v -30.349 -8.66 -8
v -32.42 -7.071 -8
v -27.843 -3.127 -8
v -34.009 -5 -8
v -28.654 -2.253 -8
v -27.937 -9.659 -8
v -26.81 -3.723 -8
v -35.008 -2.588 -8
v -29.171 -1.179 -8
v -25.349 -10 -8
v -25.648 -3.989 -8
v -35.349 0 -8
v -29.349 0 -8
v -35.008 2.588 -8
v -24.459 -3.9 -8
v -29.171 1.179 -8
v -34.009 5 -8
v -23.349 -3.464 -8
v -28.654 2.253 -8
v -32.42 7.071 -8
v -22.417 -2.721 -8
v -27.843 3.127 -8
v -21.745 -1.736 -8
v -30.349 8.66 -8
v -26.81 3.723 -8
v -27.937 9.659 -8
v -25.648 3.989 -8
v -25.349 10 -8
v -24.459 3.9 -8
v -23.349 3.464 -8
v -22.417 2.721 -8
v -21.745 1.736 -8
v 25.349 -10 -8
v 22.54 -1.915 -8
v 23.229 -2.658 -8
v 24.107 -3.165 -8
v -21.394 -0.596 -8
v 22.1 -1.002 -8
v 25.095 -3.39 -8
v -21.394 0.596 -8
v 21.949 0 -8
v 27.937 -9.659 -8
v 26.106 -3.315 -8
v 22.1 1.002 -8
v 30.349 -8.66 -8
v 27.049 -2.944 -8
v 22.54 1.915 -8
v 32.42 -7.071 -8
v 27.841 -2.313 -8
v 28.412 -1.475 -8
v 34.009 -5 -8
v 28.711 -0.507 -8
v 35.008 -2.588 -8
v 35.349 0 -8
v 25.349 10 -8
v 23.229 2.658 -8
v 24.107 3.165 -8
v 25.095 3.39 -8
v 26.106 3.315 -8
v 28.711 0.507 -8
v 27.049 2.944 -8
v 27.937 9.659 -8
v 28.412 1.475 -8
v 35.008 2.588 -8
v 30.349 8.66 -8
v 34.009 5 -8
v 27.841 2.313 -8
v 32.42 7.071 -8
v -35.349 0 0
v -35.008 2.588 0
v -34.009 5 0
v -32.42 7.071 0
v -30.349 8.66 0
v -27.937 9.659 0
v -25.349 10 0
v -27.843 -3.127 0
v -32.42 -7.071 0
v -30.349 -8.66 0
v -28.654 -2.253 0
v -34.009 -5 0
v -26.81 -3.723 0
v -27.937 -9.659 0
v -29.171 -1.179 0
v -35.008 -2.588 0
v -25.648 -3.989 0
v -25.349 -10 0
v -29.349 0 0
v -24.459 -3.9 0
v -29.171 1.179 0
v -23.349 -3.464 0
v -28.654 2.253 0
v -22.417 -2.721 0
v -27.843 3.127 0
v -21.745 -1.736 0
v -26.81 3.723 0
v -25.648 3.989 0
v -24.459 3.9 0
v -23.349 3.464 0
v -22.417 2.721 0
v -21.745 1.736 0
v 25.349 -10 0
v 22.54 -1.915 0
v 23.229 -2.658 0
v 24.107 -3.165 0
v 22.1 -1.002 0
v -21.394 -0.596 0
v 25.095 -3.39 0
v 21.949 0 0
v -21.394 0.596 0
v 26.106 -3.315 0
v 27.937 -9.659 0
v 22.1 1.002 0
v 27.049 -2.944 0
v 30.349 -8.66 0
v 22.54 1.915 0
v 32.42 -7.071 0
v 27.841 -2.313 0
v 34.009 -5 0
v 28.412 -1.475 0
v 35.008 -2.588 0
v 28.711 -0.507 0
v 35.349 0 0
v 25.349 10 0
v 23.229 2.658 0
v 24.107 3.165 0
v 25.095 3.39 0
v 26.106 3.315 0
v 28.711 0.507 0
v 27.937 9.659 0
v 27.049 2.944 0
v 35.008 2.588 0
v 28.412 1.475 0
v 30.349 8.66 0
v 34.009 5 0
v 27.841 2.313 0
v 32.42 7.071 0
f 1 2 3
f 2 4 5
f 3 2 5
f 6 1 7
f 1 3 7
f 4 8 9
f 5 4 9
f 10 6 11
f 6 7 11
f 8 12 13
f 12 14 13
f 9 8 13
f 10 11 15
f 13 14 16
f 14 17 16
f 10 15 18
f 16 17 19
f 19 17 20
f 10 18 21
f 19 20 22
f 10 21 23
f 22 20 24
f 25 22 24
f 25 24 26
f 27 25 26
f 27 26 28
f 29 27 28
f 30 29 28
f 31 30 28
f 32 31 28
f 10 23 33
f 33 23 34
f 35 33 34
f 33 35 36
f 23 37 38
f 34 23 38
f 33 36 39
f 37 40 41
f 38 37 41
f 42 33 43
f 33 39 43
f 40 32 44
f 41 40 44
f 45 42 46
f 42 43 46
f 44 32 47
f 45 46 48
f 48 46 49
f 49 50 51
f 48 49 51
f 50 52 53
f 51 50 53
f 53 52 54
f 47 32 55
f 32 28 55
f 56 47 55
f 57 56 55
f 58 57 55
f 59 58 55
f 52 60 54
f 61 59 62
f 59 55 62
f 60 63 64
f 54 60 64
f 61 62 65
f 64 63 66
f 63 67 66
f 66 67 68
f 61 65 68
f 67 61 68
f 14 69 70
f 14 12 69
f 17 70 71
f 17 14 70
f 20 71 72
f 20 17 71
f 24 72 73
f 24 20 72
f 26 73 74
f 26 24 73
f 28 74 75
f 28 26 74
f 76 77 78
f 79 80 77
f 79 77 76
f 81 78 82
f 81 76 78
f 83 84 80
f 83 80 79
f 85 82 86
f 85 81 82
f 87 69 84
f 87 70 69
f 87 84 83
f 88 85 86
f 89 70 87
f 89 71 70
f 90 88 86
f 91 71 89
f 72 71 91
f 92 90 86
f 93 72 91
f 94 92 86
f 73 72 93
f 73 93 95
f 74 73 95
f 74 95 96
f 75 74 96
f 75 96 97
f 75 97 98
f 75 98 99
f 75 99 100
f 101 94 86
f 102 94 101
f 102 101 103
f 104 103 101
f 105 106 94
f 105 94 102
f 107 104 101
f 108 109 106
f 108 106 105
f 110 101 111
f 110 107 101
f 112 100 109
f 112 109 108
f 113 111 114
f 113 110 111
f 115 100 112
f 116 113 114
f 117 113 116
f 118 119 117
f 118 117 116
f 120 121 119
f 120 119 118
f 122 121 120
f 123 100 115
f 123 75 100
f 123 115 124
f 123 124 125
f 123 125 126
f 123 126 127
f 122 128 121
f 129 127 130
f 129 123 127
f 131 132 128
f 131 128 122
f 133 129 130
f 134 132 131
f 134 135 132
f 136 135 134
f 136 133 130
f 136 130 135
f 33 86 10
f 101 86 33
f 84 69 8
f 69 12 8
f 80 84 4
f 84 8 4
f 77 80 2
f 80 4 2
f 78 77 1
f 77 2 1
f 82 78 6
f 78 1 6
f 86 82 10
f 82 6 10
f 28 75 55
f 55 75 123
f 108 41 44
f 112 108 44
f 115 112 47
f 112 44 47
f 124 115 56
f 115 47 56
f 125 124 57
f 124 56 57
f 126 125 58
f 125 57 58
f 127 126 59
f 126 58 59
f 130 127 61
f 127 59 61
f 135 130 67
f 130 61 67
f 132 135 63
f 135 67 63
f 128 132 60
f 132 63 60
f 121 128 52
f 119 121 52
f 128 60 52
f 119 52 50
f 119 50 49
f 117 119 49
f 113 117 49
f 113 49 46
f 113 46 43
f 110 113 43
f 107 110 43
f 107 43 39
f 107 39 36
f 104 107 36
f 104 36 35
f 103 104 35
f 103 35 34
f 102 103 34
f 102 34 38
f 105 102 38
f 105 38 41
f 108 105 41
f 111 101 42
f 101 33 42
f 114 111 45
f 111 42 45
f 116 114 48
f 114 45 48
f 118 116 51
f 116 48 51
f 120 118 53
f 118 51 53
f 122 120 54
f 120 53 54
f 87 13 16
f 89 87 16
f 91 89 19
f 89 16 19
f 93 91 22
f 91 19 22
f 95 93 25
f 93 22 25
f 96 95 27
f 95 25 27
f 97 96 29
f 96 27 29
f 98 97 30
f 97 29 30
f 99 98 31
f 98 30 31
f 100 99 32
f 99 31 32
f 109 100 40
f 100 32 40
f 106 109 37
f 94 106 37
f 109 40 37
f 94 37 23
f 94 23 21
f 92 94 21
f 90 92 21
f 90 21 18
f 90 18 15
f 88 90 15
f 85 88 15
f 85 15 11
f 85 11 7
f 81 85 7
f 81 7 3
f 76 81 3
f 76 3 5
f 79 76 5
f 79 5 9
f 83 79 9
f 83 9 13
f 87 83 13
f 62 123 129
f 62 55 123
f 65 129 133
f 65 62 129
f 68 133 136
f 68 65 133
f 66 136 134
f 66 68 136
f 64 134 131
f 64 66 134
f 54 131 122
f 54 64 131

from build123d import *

# Parameters (mm, degrees)
F0_W     = 70.698
F0_H     = 20
F1_DEPTH = 8
F2_D     = 8
F3_D     = 6.8
F4_R     = 9.99999


# Not quite as in the source:
# - a fillet or chamfer is up to 0.001 mm smaller than in the source, because OpenCascade refuses the exact size


with BuildPart() as f1:
    # F0 (on Top) → F1 (new body)
    with BuildSketch(Plane.XY):
        Rectangle(F0_W, F0_H)
    extrude(amount=-F1_DEPTH)

    # F2 (through all)
    with Locations(Plane.XY):
        with Locations((-25.349, 0)):
            Hole(F2_D / 2)

    # F3 (through all)
    with Locations(Plane.XY):
        with Locations((25.349, 0)):
            Hole(F3_D / 2)

    # F4 (radius 10 in the source; OpenCascade refuses exactly that, so slightly less here)
    f4_edges = [f1.edges().sort_by_distance(p)[0] for p in [
        (35.349, 10, -4),
        (35.349, -10, -4),
        (-35.349, 10, -4),
        (-35.349, -10, -4),
    ]]
    fillet(f4_edges, radius=F4_R)


solid = f1.part
